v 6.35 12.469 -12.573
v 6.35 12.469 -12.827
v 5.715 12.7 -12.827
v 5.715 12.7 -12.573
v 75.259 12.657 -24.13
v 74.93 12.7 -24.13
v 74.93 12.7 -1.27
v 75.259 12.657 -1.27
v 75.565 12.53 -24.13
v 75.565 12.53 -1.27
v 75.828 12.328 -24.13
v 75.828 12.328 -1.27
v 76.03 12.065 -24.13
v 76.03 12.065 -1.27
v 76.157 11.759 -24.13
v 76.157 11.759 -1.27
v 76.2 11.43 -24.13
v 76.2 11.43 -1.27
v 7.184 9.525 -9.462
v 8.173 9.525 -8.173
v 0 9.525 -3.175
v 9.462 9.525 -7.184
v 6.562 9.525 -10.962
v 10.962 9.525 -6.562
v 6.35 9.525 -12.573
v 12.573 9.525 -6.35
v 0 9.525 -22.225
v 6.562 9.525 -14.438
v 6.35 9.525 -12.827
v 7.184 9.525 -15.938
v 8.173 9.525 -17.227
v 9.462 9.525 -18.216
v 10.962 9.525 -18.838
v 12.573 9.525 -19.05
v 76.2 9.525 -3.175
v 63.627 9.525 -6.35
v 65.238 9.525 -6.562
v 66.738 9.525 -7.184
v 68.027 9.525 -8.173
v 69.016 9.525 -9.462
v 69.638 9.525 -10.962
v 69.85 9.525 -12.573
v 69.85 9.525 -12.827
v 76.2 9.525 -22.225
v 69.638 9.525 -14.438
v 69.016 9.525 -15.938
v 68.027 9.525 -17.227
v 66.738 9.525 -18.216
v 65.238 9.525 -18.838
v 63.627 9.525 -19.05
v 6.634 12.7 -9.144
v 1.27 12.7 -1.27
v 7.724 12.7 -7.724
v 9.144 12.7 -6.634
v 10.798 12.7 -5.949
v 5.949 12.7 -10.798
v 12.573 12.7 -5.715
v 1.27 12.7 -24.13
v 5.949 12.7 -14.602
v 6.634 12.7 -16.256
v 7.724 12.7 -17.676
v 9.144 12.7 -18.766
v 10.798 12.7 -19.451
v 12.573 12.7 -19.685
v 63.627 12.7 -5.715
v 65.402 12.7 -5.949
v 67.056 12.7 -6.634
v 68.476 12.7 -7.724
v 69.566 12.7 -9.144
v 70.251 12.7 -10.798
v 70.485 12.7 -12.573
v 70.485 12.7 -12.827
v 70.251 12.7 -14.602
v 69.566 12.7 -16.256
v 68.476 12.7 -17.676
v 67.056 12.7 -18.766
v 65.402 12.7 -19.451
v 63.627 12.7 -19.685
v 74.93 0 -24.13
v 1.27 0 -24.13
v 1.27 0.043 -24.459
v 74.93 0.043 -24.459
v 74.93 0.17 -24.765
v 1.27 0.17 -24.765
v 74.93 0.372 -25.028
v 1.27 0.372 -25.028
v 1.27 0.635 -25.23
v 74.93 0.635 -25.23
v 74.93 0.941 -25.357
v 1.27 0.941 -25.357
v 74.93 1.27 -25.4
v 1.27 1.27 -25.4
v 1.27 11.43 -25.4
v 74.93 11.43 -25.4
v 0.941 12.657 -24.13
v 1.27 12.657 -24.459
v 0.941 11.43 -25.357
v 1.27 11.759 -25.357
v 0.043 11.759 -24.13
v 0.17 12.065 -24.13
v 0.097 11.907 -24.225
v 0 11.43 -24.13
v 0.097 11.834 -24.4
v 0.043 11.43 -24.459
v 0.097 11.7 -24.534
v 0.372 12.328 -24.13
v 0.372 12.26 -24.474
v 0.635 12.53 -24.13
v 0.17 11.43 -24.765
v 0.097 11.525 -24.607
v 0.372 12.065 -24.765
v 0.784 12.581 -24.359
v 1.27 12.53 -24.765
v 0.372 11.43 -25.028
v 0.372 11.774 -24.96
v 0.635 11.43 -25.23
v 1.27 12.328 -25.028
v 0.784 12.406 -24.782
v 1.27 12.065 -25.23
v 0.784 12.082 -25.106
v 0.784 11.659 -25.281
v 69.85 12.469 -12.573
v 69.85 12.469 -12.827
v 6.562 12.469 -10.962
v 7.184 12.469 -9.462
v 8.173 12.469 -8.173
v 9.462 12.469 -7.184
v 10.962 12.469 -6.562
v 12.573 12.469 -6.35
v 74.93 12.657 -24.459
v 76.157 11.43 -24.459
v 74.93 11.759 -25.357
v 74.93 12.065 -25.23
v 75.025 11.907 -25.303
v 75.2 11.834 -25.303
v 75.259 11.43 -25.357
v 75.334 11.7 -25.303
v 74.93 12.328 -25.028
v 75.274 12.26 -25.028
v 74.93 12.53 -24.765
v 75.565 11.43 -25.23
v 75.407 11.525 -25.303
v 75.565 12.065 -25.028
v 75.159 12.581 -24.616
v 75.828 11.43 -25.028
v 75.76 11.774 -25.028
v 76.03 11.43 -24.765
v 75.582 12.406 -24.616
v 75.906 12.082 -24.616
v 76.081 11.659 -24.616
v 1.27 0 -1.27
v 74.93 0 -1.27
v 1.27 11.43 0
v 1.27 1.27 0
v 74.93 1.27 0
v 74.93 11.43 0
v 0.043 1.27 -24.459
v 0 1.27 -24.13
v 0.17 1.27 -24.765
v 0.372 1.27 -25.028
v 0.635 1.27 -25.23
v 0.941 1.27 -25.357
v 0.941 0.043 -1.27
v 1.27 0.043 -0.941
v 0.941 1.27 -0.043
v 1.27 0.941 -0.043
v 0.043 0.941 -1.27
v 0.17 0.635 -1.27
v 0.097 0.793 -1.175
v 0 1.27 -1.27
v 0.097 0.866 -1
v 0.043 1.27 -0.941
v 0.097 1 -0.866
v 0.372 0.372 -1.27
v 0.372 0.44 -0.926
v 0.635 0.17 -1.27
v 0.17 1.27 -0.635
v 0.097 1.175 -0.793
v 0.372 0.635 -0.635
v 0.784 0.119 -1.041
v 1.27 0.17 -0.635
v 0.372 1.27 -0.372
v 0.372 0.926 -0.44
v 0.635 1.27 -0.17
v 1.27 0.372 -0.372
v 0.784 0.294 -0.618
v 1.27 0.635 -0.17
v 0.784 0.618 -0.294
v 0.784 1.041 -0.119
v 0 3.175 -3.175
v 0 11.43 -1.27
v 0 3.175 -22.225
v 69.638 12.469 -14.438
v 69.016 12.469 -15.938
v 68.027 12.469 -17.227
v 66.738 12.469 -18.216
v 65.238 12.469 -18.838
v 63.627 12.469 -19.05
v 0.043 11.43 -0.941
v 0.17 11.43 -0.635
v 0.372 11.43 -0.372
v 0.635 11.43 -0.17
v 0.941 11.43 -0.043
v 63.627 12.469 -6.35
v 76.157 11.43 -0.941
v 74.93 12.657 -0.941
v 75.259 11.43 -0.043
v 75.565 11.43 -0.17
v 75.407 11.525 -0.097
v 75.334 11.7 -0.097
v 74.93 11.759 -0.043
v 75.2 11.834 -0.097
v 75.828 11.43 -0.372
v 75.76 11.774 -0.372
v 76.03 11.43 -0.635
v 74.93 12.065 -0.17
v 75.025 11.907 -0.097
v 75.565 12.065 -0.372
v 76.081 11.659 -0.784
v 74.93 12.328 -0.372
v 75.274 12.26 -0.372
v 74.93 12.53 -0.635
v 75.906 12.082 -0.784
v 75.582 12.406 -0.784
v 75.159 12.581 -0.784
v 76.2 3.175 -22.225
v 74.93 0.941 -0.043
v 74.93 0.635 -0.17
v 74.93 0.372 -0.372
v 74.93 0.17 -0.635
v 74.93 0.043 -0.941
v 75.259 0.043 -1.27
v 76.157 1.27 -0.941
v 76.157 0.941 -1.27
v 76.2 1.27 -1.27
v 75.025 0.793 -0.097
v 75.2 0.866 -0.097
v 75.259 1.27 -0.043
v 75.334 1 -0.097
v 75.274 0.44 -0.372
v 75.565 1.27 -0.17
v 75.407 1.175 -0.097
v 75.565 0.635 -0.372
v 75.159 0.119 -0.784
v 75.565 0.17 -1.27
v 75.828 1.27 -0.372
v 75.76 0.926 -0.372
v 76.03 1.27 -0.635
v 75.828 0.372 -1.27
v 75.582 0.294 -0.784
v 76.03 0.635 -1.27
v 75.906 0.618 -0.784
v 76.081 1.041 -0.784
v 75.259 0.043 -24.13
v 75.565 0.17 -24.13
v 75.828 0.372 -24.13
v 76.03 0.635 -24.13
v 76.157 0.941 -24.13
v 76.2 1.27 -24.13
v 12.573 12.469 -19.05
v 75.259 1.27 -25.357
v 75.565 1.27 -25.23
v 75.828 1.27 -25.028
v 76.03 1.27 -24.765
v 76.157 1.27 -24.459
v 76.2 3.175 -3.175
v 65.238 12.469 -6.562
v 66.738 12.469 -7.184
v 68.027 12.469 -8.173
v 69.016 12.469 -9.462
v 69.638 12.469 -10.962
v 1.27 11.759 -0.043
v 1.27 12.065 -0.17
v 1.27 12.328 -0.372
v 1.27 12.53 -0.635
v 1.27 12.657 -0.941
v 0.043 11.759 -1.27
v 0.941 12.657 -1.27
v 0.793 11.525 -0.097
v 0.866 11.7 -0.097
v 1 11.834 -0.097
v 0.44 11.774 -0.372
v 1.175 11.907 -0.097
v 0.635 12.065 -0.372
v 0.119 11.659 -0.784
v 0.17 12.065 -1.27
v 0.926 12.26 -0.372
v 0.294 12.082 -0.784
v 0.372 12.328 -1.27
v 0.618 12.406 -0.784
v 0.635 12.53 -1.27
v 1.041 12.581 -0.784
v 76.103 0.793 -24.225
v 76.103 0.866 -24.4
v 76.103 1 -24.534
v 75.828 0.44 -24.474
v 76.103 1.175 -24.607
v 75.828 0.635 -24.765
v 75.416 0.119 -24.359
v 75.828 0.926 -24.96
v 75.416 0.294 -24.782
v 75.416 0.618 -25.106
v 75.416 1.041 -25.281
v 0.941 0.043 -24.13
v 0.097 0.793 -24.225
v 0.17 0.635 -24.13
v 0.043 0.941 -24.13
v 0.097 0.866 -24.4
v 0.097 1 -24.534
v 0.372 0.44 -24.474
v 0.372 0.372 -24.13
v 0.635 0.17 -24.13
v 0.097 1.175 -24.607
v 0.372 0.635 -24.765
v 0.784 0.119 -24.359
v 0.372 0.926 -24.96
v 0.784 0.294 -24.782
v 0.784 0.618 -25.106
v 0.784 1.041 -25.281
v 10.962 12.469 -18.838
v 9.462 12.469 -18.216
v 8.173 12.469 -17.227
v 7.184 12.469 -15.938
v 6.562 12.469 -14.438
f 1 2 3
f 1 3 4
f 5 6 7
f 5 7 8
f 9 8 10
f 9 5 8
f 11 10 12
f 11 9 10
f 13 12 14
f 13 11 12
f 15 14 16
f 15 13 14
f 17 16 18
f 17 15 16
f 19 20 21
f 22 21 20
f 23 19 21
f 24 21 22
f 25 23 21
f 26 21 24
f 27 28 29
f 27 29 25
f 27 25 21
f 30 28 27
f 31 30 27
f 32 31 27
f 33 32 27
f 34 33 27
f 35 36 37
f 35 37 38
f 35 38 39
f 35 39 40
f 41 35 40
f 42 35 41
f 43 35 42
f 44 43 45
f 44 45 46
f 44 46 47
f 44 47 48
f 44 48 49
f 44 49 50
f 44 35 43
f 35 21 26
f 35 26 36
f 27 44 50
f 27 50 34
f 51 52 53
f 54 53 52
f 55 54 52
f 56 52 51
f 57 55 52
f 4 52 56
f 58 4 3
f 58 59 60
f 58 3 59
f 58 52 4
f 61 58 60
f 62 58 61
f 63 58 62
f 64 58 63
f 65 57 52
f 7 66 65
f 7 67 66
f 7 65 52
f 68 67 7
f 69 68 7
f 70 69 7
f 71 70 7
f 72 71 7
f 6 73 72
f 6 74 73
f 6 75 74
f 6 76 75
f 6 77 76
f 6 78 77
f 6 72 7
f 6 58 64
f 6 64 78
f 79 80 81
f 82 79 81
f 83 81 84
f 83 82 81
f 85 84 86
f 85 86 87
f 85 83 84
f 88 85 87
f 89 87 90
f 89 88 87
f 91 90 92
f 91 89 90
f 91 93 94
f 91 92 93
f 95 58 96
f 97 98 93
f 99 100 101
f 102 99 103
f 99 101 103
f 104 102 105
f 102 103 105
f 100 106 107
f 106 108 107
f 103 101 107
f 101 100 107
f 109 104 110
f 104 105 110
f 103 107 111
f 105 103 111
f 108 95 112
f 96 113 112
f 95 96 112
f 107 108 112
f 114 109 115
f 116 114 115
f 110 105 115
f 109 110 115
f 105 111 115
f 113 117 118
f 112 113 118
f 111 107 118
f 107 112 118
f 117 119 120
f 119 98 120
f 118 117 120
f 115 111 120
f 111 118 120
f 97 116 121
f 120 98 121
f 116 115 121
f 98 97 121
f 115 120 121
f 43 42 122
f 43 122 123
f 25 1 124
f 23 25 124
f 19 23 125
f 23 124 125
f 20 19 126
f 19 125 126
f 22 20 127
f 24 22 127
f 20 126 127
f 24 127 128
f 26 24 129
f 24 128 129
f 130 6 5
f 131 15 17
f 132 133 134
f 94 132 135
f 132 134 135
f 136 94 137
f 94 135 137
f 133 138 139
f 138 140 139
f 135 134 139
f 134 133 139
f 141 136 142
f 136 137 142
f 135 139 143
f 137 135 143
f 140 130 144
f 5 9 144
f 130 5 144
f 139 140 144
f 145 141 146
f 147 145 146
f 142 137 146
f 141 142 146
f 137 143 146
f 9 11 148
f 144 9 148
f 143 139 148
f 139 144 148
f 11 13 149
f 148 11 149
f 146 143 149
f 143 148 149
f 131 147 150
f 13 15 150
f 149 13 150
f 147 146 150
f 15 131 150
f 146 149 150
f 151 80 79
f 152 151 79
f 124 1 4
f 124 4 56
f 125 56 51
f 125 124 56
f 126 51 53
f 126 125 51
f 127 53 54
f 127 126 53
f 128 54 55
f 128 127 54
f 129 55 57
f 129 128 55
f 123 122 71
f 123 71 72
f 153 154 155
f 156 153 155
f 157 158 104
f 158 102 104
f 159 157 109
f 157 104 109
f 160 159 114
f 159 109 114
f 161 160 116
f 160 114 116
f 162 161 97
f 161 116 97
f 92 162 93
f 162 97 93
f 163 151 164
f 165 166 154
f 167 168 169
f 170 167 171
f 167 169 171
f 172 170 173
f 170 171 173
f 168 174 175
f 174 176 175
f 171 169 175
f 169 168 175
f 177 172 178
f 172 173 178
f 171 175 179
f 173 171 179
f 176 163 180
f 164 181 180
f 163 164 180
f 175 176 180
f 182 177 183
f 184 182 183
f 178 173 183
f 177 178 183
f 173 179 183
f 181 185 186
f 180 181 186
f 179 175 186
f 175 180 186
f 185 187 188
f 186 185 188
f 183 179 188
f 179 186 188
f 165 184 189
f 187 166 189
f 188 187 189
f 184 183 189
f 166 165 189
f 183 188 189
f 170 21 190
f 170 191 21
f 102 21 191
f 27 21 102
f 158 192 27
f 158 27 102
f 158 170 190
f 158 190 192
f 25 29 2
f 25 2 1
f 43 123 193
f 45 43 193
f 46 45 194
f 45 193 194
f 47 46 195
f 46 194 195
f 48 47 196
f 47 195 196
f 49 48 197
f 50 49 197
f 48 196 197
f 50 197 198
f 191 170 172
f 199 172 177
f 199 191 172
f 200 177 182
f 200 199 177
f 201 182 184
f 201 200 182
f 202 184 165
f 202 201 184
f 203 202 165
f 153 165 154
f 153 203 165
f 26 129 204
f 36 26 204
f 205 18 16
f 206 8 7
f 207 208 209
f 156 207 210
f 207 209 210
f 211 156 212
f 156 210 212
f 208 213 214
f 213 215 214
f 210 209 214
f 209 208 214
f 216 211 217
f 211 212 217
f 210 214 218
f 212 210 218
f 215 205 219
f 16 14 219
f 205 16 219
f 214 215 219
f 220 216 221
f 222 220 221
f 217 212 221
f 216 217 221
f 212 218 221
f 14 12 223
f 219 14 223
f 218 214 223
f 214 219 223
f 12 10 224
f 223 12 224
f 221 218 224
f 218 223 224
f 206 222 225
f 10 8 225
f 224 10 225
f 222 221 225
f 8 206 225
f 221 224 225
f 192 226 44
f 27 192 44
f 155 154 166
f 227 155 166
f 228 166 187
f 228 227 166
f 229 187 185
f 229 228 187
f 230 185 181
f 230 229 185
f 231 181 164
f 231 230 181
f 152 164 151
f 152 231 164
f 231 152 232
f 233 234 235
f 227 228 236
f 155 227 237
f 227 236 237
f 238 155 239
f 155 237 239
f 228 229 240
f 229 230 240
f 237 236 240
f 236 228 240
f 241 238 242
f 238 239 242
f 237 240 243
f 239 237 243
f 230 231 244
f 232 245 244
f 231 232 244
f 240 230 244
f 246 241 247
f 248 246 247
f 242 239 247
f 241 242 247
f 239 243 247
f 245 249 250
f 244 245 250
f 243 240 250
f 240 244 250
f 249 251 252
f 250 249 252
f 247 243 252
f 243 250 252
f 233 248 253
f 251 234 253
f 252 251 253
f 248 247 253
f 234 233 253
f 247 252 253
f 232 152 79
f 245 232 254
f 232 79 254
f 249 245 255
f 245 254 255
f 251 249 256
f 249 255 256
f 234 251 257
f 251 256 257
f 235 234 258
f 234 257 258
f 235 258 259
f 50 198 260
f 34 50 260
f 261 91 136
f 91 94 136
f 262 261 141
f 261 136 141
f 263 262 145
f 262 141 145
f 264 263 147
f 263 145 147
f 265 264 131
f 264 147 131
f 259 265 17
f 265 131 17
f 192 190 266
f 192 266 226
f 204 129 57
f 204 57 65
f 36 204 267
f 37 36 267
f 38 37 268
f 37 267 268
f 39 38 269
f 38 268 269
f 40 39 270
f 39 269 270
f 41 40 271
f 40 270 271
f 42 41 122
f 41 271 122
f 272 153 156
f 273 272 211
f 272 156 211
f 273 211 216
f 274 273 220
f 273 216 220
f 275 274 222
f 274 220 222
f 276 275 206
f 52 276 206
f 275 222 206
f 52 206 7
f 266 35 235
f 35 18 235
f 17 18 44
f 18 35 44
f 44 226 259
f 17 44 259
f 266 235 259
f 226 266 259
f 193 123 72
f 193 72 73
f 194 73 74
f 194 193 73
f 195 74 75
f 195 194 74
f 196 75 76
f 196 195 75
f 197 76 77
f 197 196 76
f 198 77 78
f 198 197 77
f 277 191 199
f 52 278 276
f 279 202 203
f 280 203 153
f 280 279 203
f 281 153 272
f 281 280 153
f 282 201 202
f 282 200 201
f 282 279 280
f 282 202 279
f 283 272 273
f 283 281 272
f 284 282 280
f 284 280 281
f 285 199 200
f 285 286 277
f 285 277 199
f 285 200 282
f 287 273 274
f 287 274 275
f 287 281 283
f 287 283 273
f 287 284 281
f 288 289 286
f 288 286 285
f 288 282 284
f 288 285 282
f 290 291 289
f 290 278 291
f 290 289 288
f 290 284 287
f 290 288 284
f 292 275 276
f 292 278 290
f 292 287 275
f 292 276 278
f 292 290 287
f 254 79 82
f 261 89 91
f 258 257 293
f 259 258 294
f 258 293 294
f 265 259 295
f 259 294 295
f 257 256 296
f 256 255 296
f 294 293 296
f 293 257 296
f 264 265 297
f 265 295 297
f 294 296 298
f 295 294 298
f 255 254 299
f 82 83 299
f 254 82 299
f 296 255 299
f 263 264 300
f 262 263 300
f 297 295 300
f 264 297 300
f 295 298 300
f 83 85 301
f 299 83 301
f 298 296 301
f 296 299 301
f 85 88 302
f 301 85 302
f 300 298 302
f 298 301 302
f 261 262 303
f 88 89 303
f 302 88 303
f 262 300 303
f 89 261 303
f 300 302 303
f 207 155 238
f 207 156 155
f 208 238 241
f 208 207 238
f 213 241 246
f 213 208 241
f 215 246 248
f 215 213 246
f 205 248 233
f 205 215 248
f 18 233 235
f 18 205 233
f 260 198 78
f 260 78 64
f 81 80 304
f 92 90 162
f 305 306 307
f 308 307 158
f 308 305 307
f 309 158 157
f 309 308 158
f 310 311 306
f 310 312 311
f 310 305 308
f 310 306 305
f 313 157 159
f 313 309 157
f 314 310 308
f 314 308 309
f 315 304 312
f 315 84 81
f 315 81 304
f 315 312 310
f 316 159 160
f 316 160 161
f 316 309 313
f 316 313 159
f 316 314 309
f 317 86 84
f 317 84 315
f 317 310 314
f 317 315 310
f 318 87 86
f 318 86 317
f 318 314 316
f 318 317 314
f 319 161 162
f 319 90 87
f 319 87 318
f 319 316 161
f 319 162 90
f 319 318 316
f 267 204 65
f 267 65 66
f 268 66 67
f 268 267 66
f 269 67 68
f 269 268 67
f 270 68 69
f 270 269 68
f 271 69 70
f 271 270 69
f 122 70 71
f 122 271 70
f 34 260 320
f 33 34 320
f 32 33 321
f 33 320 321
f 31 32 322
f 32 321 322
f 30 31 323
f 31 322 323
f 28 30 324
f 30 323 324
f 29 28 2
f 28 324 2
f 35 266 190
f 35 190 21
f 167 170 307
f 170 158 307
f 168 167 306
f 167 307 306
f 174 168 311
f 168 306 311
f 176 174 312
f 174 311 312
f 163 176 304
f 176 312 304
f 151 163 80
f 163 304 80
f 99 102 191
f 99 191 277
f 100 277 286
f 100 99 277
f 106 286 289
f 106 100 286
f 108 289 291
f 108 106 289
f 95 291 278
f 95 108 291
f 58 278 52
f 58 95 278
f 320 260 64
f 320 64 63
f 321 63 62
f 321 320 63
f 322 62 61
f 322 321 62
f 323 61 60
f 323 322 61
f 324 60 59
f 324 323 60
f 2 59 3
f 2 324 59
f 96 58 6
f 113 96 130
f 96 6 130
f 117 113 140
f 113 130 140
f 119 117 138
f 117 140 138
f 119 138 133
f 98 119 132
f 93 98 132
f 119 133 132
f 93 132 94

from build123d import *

# Parameters (mm, degrees)
SKETCH1_W           = 76.2
SKETCH1_H           = 25.4
BOSS_EXTRUDE1_DEPTH = 12.7
SKETCH2_W           = 19.05
SKETCH2_H           = 6.35
CUT_EXTRUDE1_DEPTH  = 82.319677815
CUT_EXTRUDE2_DEPTH  = 3.175
FILLET1_R           = 1.27
CHAMFER1_SIZE       = 0.635
CHAMFER1_SIZE2      = 0.231121099


with BuildPart() as part:
    # Sketch1 → Boss-Extrude1 (new body)
    with BuildSketch(Plane(origin=(0, 0, 0), x_dir=(1, 0, 0), z_dir=(0, 1, 0))):
        with Locations((38.1, 12.7)):
            Rectangle(SKETCH1_W, SKETCH1_H)
    extrude(amount=BOSS_EXTRUDE1_DEPTH)

    # Sketch2 → Cut-Extrude1 (cut, through all)
    with BuildSketch(Plane(origin=(76.2, 0, 0), x_dir=(0, 0, -1), z_dir=(1, 0, 0))):
        with Locations((12.7, 6.35)):
            Rectangle(SKETCH2_W, SKETCH2_H)
    extrude(amount=-CUT_EXTRUDE1_DEPTH, mode=Mode.SUBTRACT)

    # Sketch3 → Cut-Extrude2 (cut)
    with BuildSketch(Plane(origin=(0, 12.7, 0), x_dir=(1, 0, 0), z_dir=(0, 1, 0))):
        with BuildLine():
            Line((12.573, 6.35), (63.627, 6.35))
            ThreePointArc((63.627, 6.35), (68.027325499, 8.172674501), (69.85, 12.573))
            Line((69.85, 12.573), (69.85, 12.827))
            ThreePointArc((69.85, 12.827), (68.027325499, 17.227325499), (63.627, 19.05))
            Line((63.627, 19.05), (12.573, 19.05))
            ThreePointArc((12.573, 19.05), (8.172674501, 17.227325499), (6.35, 12.827))
            Line((6.35, 12.827), (6.35, 12.573))
            ThreePointArc((6.35, 12.573), (8.172674501, 8.172674501), (12.573, 6.35))
        make_face()
    extrude(amount=-CUT_EXTRUDE2_DEPTH, mode=Mode.SUBTRACT)

    # Fillet1
    fillet1_edges = [part.edges().sort_by_distance(p)[0] for p in [
        (76.2, 12.7, -12.7),
        (38.1, 12.7, -25.4),
        (0, 12.7, -12.7),
        (38.1, 0, -25.4),
        (76.2, 0, -12.7),
        (38.1, 0, 0),
        (0, 0, -12.7),
        (0, 6.35, -25.4),
        (76.2, 6.35, -25.4),
        (76.2, 6.35, 0),
        (0, 6.35, 0),
        (38.1, 12.7, 0),
    ]]
    fillet(fillet1_edges, radius=FILLET1_R)

    # Chamfer1
    chamfer1_edges = [part.edges().sort_by_distance(p)[0] for p in [
        (68.027325499, 12.7, -17.227325499),
        (38.1, 12.7, -19.05),
        (8.172674501, 12.7, -17.227325499),
        (6.35, 12.7, -12.7),
        (8.172674501, 12.7, -8.172674501),
        (38.1, 12.7, -6.35),
        (68.027325499, 12.7, -8.172674501),
        (69.85, 12.7, -12.7),
    ]]
    chamfer1_side = [part.faces().sort_by_distance(p)[0] for p in [
        (74.158742896, 12.7, -12.7),
    ]]
    chamfer(chamfer1_edges, length=CHAMFER1_SIZE, length2=CHAMFER1_SIZE2, reference=chamfer1_side[0])


solid = part.part
